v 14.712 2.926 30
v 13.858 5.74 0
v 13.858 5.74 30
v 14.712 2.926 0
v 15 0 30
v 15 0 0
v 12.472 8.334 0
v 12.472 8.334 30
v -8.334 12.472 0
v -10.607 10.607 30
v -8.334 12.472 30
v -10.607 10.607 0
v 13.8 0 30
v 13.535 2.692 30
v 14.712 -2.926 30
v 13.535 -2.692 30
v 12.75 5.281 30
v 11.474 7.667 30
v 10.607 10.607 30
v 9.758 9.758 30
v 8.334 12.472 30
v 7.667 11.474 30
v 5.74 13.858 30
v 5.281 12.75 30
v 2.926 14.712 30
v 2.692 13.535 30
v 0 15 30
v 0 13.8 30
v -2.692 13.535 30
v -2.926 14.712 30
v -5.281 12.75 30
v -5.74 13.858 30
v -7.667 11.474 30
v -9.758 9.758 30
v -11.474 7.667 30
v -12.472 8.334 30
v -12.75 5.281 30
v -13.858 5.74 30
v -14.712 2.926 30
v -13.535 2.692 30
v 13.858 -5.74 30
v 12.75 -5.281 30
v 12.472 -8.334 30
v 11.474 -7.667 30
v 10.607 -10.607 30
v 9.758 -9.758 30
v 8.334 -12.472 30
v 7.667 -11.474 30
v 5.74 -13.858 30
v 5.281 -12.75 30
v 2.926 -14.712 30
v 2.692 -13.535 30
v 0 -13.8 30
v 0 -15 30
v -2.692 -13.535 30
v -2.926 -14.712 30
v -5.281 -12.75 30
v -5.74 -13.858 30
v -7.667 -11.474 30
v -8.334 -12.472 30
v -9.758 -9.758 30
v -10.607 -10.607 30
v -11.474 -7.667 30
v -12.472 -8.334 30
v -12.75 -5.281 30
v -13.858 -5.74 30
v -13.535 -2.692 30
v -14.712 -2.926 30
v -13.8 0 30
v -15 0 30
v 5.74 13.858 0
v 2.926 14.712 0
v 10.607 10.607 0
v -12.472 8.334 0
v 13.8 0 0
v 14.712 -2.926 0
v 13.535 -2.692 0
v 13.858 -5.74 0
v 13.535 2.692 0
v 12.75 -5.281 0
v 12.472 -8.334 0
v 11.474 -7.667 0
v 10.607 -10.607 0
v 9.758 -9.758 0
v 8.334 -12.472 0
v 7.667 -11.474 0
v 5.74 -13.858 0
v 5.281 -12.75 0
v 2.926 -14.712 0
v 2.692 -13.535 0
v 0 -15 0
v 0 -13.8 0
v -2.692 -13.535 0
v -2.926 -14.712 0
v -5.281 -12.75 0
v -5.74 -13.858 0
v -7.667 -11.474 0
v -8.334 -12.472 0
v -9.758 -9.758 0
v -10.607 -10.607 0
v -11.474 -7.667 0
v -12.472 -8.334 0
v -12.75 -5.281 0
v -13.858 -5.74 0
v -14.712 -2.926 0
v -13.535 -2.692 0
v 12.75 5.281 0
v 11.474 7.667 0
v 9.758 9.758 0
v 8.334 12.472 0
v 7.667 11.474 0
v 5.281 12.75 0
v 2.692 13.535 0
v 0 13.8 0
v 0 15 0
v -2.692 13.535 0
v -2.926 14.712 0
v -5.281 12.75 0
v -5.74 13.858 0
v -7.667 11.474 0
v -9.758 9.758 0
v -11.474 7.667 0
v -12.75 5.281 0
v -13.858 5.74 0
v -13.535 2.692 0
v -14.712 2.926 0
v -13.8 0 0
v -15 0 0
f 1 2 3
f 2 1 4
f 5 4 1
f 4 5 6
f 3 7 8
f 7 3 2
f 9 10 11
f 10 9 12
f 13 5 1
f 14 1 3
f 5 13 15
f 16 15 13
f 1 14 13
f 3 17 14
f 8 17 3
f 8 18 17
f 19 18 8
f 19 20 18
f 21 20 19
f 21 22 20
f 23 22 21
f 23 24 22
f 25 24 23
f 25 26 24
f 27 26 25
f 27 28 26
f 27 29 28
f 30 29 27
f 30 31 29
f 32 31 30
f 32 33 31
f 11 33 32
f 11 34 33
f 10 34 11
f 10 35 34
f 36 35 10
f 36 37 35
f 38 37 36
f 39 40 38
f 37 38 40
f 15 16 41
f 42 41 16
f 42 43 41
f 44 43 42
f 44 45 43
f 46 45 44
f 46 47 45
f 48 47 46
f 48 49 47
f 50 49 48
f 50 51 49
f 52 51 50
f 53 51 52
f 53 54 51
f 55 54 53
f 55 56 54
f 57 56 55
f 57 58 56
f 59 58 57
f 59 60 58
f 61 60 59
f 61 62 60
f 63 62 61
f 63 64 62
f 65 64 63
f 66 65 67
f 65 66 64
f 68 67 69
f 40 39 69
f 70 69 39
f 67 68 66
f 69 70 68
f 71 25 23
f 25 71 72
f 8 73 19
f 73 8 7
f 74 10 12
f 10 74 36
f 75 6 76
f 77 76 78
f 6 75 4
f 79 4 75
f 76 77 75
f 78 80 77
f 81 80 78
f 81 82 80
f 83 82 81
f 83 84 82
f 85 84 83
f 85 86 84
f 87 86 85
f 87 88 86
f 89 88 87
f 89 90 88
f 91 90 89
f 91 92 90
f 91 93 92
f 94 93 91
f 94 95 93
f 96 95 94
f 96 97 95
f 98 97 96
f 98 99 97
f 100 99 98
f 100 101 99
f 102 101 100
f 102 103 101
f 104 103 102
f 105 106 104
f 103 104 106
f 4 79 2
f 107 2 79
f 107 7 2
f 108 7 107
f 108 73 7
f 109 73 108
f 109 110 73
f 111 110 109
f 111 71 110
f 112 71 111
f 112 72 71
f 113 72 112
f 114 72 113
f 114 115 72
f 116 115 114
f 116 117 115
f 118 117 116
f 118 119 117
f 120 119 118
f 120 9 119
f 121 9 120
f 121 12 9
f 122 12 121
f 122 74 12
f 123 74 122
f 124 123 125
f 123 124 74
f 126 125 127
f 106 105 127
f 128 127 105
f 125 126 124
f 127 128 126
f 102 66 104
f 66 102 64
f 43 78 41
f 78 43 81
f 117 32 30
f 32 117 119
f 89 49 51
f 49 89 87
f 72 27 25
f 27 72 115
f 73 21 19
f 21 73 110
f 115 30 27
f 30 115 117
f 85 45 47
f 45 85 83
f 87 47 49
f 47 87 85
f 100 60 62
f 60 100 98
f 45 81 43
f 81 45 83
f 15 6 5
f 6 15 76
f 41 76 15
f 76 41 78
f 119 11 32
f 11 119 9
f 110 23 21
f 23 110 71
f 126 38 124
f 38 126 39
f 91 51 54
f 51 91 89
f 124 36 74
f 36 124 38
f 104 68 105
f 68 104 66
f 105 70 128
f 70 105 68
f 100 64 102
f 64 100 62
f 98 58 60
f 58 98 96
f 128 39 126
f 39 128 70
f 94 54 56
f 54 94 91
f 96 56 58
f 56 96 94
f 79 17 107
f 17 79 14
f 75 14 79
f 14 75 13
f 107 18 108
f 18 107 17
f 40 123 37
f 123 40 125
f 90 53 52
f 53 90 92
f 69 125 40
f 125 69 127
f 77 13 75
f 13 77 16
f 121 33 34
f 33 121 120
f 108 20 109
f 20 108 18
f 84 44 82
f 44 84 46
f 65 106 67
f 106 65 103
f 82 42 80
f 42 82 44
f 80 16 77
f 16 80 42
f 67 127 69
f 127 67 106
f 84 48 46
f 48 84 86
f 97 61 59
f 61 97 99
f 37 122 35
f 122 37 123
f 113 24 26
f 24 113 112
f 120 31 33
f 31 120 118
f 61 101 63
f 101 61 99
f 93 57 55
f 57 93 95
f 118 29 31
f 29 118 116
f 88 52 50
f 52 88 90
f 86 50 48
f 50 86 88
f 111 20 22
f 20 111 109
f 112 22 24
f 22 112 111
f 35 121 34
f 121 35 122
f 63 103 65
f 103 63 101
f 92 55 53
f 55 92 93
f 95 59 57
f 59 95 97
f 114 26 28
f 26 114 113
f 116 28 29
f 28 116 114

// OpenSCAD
$fn = 32;

// ----------------------------------------------------------------------
// Thin tube: 1.2 mm wall
// ----------------------------------------------------------------------

// --- parameters (mm) ---
tube_od = 30;             // outer diameter
tube_h = 30;              // height, Z
wall = 1.2;               // wall thickness

difference() {
  cylinder(h = tube_h, d = tube_od);
  translate([0, 0, -1]) cylinder(h = tube_h + 2, d = tube_od - 2 * wall);
}
